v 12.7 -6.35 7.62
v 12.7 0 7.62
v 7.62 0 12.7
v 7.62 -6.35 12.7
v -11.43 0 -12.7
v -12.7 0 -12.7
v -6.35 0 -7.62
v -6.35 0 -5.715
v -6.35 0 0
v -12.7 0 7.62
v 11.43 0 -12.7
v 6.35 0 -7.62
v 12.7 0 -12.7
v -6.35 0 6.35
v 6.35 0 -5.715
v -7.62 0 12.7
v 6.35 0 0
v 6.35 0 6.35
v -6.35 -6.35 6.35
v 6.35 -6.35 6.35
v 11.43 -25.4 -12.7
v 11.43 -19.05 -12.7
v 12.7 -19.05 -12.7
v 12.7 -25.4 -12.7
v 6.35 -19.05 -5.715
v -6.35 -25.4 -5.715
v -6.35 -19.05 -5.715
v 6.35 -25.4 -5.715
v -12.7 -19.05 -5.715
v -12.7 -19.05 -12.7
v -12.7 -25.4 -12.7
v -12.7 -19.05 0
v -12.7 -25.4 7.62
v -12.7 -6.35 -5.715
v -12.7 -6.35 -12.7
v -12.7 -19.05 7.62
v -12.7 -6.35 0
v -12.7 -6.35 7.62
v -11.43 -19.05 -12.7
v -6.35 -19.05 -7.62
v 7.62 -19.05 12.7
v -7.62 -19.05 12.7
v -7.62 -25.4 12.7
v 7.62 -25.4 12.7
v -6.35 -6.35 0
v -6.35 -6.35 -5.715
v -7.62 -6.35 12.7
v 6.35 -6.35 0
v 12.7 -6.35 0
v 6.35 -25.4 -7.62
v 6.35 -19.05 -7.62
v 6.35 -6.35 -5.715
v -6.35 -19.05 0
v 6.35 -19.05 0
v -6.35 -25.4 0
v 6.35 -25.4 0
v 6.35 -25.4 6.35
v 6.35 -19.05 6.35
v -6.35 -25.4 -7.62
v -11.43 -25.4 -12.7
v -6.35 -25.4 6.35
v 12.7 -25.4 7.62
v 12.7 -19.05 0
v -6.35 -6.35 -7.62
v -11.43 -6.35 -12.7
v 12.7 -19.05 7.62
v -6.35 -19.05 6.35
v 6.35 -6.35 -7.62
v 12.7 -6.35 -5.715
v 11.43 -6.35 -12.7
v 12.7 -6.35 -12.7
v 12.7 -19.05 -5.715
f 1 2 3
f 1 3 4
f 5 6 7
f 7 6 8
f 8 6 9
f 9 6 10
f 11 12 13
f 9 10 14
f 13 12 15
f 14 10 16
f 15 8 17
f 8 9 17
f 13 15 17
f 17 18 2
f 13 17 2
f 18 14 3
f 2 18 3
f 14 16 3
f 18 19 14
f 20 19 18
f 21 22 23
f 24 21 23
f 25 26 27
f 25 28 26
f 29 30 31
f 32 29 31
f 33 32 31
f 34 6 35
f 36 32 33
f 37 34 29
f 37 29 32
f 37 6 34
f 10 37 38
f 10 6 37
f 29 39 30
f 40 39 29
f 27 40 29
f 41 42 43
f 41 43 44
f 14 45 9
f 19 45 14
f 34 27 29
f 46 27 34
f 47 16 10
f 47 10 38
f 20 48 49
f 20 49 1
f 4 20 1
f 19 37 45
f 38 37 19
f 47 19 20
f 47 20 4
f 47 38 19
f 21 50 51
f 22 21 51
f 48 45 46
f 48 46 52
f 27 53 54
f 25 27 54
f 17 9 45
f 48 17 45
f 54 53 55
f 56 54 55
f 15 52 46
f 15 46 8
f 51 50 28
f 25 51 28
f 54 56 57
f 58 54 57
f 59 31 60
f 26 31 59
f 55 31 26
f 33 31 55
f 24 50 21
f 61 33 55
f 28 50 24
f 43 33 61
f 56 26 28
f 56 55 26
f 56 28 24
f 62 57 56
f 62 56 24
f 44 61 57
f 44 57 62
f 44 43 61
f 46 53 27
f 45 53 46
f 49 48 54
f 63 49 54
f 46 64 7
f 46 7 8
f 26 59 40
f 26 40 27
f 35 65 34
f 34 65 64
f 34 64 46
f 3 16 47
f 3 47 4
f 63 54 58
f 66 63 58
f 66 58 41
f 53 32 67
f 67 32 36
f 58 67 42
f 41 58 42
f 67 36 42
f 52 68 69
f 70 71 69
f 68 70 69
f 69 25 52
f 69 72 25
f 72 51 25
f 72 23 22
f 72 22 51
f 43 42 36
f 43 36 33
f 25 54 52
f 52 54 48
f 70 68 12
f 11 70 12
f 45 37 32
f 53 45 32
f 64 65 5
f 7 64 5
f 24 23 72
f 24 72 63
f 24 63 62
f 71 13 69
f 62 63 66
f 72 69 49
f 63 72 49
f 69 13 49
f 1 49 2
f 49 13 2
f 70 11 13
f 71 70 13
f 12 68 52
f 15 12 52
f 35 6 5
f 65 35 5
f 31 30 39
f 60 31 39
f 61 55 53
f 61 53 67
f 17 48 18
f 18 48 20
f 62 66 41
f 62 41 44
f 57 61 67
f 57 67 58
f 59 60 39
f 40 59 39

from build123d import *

# Parameters (mm, degrees)
F0_W     = 25.4
F0_H     = 25.4
F1_DEPTH = 25.4
F2_W     = 12.7
F2_H     = 6.985
F2_H_2   = 6.35
F3_DEPTH = 25.401
F4_W     = 12.7
F4_H     = 12.7
F5_DEPTH = 25.401
F6_W     = 12.7
F6_H     = 6.985
F7_DEPTH = 25.401
F8_W     = 12.7
F8_H     = 12.7
F9_DEPTH = 12.701
F10_SIZE = 5.08


with BuildPart() as f1:
    # F0 (on Front) → F1 (new body)
    with BuildSketch(Plane.XZ):
        Rectangle(F0_W, F0_H)
    extrude(amount=F1_DEPTH)

    # F2 (on face) → F3 (cut, through all)
    with BuildSketch(Plane.XZ.offset(25.4)):
        with Locations((0, -9.2075)):
            Rectangle(F2_W, F2_H)
        with Locations((0, 3.175)):
            Rectangle(F2_W, F2_H_2)
    extrude(amount=-F3_DEPTH, mode=Mode.SUBTRACT)

    # F4 (on face) → F5 (cut, through all)
    with BuildSketch(Plane(origin=(-12.7, 0, 0), x_dir=(0, -1, 0), z_dir=(-1, 0, 0))):
        with Locations((12.7, 6.35)):
            Rectangle(F4_W, F4_H)
    extrude(amount=-F5_DEPTH, mode=Mode.SUBTRACT)

    # F6 (on face) → F7 (cut, through all)
    with BuildSketch(Plane.YZ.offset(12.7)):
        with Locations((-12.7, -9.2075)):
            Rectangle(F6_W, F6_H)
    extrude(amount=-F7_DEPTH, mode=Mode.SUBTRACT)

    # F8 (on face) → F9 (cut, through all)
    with BuildSketch(Plane.XY):
        with Locations((0, -12.7)):
            Rectangle(F8_W, F8_H)
    extrude(amount=-F9_DEPTH, mode=Mode.SUBTRACT)

    # F10
    f10_edges = [f1.edges().sort_by_distance(p)[0] for p in [
        (6.35, -22.225, -12.7),
        (6.35, -3.175, -12.7),
        (-6.35, -3.175, -12.7),
        (-6.35, -22.225, -12.7),
        (12.7, -3.175, 12.7),
        (12.7, -22.225, 12.7),
        (-12.7, -22.225, 12.7),
        (-12.7, -3.175, 12.7),
    ]]
    chamfer(f10_edges, length=F10_SIZE)


solid = f1.part
